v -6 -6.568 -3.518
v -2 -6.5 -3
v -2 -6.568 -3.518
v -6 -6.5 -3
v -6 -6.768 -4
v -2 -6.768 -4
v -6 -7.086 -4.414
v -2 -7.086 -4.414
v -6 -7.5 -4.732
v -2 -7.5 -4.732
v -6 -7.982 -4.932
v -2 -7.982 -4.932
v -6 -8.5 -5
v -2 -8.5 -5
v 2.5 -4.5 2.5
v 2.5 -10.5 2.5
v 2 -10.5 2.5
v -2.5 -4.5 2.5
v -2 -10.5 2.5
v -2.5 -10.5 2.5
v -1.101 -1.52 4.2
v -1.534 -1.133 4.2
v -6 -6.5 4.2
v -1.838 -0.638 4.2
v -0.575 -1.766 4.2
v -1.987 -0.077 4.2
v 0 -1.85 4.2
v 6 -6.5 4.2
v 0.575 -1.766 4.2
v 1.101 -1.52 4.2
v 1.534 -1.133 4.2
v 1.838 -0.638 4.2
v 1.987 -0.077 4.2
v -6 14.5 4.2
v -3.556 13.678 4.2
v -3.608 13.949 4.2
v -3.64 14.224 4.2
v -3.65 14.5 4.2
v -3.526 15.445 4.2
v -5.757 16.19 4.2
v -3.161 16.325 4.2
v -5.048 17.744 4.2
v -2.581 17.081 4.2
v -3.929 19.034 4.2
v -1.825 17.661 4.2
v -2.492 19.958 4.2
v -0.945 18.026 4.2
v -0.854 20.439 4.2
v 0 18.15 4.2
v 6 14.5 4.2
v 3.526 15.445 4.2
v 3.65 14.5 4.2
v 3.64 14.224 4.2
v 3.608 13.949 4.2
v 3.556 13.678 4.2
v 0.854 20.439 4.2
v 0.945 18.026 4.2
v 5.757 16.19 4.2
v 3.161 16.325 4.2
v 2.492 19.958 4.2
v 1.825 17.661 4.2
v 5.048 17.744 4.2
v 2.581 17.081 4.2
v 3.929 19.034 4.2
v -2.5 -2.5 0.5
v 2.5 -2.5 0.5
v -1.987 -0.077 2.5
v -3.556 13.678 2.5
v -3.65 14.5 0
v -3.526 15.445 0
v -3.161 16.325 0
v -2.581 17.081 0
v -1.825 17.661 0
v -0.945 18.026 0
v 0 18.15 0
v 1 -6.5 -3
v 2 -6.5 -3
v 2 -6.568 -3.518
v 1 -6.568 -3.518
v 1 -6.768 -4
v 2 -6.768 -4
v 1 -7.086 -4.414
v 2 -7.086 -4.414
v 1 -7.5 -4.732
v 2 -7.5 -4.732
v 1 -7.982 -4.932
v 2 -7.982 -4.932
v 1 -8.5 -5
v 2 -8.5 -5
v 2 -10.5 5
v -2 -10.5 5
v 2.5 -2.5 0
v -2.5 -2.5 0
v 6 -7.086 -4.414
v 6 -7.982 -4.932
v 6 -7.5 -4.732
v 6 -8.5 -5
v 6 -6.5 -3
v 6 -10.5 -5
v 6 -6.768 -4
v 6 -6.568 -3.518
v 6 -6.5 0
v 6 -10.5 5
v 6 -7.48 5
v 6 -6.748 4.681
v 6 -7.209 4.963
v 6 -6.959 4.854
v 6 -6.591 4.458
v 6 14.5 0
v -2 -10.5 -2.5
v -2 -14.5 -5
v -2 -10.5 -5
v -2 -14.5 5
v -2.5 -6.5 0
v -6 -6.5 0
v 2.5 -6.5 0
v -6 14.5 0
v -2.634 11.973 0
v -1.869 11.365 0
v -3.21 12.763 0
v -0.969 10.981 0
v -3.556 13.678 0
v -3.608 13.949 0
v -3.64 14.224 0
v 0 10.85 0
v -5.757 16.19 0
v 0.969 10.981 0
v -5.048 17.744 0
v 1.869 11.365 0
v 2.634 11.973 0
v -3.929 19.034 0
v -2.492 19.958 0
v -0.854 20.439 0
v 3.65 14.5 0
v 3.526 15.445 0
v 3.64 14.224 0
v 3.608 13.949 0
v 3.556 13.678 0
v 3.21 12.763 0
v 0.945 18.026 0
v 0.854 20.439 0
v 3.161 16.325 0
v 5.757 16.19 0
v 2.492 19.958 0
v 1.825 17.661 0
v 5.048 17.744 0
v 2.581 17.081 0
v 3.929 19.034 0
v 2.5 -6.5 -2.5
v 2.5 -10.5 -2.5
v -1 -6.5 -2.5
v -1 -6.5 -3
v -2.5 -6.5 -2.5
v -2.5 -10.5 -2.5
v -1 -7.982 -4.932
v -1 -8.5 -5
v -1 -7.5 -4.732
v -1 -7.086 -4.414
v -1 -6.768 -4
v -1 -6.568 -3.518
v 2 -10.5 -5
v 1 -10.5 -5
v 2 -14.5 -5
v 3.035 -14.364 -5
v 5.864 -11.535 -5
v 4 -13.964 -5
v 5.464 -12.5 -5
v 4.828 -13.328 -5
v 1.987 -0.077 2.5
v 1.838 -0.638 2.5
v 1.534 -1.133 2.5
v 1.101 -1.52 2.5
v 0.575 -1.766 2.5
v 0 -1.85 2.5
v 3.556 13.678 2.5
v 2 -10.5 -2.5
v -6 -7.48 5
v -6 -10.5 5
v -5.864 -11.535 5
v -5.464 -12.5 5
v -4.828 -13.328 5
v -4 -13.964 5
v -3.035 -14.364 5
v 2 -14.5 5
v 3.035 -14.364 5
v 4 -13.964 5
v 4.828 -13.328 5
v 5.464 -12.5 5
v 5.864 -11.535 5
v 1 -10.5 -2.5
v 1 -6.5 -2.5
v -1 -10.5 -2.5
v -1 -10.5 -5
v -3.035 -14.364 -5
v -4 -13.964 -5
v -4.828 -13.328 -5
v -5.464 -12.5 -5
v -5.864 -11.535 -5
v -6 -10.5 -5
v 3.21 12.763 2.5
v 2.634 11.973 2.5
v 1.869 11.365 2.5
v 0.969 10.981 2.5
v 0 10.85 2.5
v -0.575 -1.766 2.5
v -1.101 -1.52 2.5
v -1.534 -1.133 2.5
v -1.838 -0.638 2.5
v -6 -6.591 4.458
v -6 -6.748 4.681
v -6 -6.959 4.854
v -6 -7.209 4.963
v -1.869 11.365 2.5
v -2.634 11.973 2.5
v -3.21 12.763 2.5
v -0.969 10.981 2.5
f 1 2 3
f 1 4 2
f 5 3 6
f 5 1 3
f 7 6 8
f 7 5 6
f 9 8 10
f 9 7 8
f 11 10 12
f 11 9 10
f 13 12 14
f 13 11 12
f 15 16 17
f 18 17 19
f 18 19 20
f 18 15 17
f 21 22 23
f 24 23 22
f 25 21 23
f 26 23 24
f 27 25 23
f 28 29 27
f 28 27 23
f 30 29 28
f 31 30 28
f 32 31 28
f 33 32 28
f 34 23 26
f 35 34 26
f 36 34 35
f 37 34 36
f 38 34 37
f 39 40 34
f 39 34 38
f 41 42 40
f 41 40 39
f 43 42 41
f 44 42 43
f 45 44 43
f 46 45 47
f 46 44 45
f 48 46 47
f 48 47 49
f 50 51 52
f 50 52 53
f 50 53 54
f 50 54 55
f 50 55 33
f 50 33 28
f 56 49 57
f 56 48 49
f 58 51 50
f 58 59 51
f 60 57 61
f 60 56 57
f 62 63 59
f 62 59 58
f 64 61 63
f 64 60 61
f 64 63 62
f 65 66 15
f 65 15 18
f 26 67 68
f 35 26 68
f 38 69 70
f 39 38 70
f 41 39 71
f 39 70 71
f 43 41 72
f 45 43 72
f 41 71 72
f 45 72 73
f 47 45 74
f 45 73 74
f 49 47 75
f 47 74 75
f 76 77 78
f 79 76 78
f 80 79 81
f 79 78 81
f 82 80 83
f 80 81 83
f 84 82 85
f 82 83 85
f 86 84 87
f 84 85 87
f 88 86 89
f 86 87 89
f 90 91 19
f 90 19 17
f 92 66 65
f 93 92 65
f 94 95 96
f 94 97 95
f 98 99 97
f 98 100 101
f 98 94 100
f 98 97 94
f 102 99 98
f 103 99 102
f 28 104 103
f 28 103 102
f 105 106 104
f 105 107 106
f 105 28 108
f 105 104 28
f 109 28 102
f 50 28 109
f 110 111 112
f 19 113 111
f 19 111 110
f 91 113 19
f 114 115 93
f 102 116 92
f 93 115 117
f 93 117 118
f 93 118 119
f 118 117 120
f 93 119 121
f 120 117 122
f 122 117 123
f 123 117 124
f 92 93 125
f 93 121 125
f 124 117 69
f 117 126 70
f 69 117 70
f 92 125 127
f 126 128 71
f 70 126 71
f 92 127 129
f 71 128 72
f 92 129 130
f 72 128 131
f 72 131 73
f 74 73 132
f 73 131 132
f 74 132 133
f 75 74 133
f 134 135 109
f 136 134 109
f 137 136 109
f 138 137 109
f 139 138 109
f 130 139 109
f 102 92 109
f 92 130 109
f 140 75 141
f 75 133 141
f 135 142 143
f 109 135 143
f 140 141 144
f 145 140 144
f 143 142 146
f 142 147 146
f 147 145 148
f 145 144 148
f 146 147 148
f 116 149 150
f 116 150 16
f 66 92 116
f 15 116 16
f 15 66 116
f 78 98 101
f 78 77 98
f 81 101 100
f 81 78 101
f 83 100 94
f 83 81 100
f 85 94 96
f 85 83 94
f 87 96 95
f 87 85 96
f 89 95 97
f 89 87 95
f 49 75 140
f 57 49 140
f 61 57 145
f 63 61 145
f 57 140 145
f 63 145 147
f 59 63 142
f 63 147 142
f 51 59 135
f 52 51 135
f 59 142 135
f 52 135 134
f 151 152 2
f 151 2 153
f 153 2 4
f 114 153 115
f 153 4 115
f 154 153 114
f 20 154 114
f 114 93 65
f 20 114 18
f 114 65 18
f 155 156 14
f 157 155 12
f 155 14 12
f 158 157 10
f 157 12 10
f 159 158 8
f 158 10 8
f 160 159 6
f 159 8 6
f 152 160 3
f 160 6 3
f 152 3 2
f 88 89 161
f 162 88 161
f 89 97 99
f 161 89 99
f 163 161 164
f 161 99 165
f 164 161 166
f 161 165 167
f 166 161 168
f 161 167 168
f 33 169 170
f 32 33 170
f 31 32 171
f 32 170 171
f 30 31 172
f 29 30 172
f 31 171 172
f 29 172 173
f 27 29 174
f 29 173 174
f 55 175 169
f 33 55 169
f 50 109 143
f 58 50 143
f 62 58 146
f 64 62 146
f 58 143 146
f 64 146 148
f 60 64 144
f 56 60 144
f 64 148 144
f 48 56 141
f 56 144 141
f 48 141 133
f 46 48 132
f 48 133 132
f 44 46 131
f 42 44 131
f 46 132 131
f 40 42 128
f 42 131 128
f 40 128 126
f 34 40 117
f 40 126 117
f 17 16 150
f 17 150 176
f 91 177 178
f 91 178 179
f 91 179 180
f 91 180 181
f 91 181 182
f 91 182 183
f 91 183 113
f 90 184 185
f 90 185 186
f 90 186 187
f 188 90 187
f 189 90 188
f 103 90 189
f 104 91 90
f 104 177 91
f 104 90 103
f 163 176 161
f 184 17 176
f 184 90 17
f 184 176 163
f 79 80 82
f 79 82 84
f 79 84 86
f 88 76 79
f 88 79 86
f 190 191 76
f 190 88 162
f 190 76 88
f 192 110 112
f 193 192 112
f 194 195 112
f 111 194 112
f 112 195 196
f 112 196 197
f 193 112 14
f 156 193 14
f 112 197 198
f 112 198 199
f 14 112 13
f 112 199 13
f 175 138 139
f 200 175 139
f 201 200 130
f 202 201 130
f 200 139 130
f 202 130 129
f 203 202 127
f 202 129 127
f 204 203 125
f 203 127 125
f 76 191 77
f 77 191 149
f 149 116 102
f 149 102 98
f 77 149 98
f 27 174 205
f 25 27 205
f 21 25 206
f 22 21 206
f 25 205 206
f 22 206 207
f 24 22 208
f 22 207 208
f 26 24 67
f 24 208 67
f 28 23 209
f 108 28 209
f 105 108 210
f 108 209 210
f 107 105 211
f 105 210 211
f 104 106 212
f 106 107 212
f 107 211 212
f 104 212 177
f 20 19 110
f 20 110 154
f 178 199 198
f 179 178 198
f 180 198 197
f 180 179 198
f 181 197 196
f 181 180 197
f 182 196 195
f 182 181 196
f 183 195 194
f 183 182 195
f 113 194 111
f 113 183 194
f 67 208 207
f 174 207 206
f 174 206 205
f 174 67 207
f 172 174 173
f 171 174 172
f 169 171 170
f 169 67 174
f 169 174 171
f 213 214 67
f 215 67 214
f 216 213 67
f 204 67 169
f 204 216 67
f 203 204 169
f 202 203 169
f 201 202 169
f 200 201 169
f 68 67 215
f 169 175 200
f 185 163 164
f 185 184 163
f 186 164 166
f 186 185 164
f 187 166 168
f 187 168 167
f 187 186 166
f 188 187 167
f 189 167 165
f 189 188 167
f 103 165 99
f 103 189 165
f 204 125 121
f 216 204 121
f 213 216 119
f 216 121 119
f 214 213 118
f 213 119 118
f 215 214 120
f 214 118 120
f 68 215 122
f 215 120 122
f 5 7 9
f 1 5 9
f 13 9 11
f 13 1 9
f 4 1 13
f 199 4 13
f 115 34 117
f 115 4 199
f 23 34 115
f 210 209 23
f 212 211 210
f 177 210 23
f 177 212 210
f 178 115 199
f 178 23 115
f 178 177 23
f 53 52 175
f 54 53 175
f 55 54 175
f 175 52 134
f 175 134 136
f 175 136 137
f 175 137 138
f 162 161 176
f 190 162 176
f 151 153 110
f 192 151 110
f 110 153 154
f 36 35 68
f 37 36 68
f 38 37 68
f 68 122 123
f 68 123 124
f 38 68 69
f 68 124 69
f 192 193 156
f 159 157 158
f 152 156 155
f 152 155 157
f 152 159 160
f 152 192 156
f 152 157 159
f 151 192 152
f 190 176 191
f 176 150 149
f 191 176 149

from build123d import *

# Parameters (mm, degrees)
F1_DEPTH      = 4.2
F2_DEPTH      = 2.5
F3_DEPTH      = 5
F3_DEPTH_BACK = 5
F4_W          = 5
F4_H          = 5
F5_DEPTH      = 4
F5_DEPTH_BACK = 4
F6_SIZE       = 2
F7_W          = 4
F7_H          = 2.5
F8_DEPTH      = 25
F9_R          = 2
F11_DEPTH     = 1
F13_DEPTH     = 1
F14_T1_DEPTH  = 16.8989794856


# Not quite as in the source:
# - a fillet or chamfer that OpenCascade refuses, or shapes differently, is made with other operations: its cross-section is extruded or revolved along the edge and cut away or added


with BuildPart() as f1:
    # F0 (on Top) → F1 (new body)
    with BuildSketch(Plane.XY):
        with BuildLine():
            ThreePointArc((6, 14.5), (0, 20.5), (-6, 14.5))
            Line((-6, 14.5), (-3.65, 14.5))
            ThreePointArc((-3.65, 14.5), (-2.5809397513, 17.0809397513), (0, 18.15))
            ThreePointArc((0, 18.15), (2.5809397513, 17.0809397513), (3.65, 14.5))
            Line((3.65, 14.5), (6, 14.5))
        make_face()
        with BuildLine():
            Line((6, -6.5), (-6, -6.5))
            Line((-6, -6.5), (-6, -10.5))
            ThreePointArc((-6, -10.5), (-4.8284271247, -13.3284271247), (-2, -14.5))
            Line((-2, -14.5), (-2, -10.5))
            Line((-2, -10.5), (0, -10.5))
            Line((0, -10.5), (2, -10.5))
            Line((2, -10.5), (2, -14.5))
            ThreePointArc((2, -14.5), (4.8284271247, -13.3284271247), (6, -10.5))
            Line((6, -10.5), (6, -6.5))
        make_face()
        with BuildLine():
            Line((-3.65, 14.5), (-6, 14.5))
            Line((-6, 14.5), (-6, -6.5))
            Line((-6, -6.5), (6, -6.5))
            Line((6, -6.5), (6, 14.5))
            Line((6, 14.5), (3.65, 14.5))
            ThreePointArc((3.65, 14.5), (3.6264789057, 14.0862963062), (3.5562187692, 13.6779245377))
            Line((3.5562187692, 13.6779245377), (1.9871117367, -0.0766868897))
            ThreePointArc((1.9871117367, -0.0766868897), (1.3316580306, -1.3422087286), (0, -1.85))
            ThreePointArc((0, -1.85), (-1.3316580225, -1.3422087358), (-1.9871117342, -0.0766869112))
            Line((-1.9871117342, -0.0766869112), (-3.5562187692, 13.6779245377))
            ThreePointArc((-3.5562187692, 13.6779245377), (-3.6264789057, 14.0862963062), (-3.65, 14.5))
        make_face()
    extrude(amount=F1_DEPTH)

    # F0 (on Top) → F2 (join)
    with BuildSketch(Plane.XY):
        with BuildLine():
            ThreePointArc((0, 10.85), (-2.2717751388, 11.6431594866), (-3.5562187692, 13.6779245377))
            Line((-3.5562187692, 13.6779245377), (-1.9871117342, -0.0766869112))
            ThreePointArc((-1.9871117342, -0.0766869112), (-1.4922087358, 1.4816580225), (0, 2.15))
            Line((0, 2.15), (0, 10.85))
        make_face()
        with BuildLine():
            ThreePointArc((3.5562187692, 13.6779245377), (2.2717751388, 11.6431594866), (0, 10.85))
            Line((0, 10.85), (0, 2.15))
            ThreePointArc((0, 2.15), (1.4142135624, 1.5642135624), (2, 0.15))
            ThreePointArc((2, 0.15), (1.9967753346, 0.0364735127), (1.9871117367, -0.0766868897))
            Line((1.9871117367, -0.0766868897), (3.5562187692, 13.6779245377))
        make_face()
        with BuildLine():
            ThreePointArc((0, 2.15), (-1.4922087358, 1.4816580225), (-1.9871117342, -0.0766869112))
            ThreePointArc((-1.9871117342, -0.0766869112), (-1.3316580225, -1.3422087358), (0, -1.85))
            Line((0, -1.85), (0, 2.15))
        make_face()
        with BuildLine():
            ThreePointArc((2, 0.15), (1.4142135624, 1.5642135624), (0, 2.15))
            Line((0, 2.15), (0, -1.85))
            ThreePointArc((0, -1.85), (1.3316580306, -1.3422087286), (1.9871117367, -0.0766868897))
            ThreePointArc((1.9871117367, -0.0766868897), (1.9967753346, 0.0364735127), (2, 0.15))
        make_face()
    extrude(amount=F2_DEPTH)

    # F0 (on Top) → F3 (join, two sides)
    with BuildSketch(Plane.XY) as f3_sk:
        with BuildLine():
            Line((6, -6.5), (-6, -6.5))
            Line((-6, -6.5), (-6, -10.5))
            ThreePointArc((-6, -10.5), (-4.8284271247, -13.3284271247), (-2, -14.5))
            Line((-2, -14.5), (-2, -10.5))
            Line((-2, -10.5), (0, -10.5))
            Line((0, -10.5), (2, -10.5))
            Line((2, -10.5), (2, -14.5))
            ThreePointArc((2, -14.5), (4.8284271247, -13.3284271247), (6, -10.5))
            Line((6, -10.5), (6, -6.5))
        make_face()
    extrude(amount=F3_DEPTH)
    extrude(f3_sk.sketch, amount=-F3_DEPTH_BACK)

    # F4 (on face) → F5 (cut, two sides)
    with BuildSketch(Plane(origin=(0, -6.5, 0), x_dir=(-1, 0, 0), z_dir=(0, 1, 0))) as f5_sk:
        Rectangle(F4_W, F4_H)
    extrude(amount=-F5_DEPTH, mode=Mode.SUBTRACT)
    extrude(f5_sk.sketch, amount=F5_DEPTH_BACK, mode=Mode.SUBTRACT)

    # F6
    f6_edges = [f1.edges().sort_by_distance(p)[0] for p in [
        (0, -2.5, 2.5),
    ]]
    chamfer(f6_edges, length=F6_SIZE)

    # F7 (on face) → F8 (cut)
    with BuildSketch(Plane.XZ.offset(10.5)):
        with Locations((0, -3.75)):
            Rectangle(F7_W, F7_H)
    extrude(amount=-F8_DEPTH, mode=Mode.SUBTRACT)

    # F9
    f9_edges = [f1.edges().sort_by_distance(p)[0] for p in [
        (4, -6.5, -5),
        (-4, -6.5, -5),
    ]]
    fillet(f9_edges, radius=F9_R)

    # F10 (on face) → F11 (join)
    with BuildSketch(Plane.YZ.offset(-2)):
        with BuildLine():
            Line((-6.5, -2.5), (-10.5, -2.5))
            Line((-10.5, -2.5), (-10.5, -5))
            Line((-10.5, -5), (-8.5, -5))
            ThreePointArc((-8.5, -5), (-7.0857864376, -4.4142135624), (-6.5, -3))
            Line((-6.5, -3), (-6.5, -2.5))
        make_face()
    extrude(amount=F11_DEPTH)

    # F12 (on face) → F13 (join)
    with BuildSketch(Plane(origin=(2, 0, 0), x_dir=(0, -1, 0), z_dir=(-1, 0, 0))):
        with BuildLine():
            Line((10.5, -5), (10.5, -2.5))
            Line((10.5, -2.5), (6.5, -2.5))
            Line((6.5, -2.5), (6.5, -3))
            ThreePointArc((6.5, -3), (7.0857864376, -4.4142135624), (8.5, -5))
            Line((8.5, -5), (10.5, -5))
        make_face()
    extrude(amount=F13_DEPTH)

    # F14: fillet of radius 1 on 1 edges, made by hand

    # F14_s2 → F14_t1 (cut)
    with BuildSketch(Plane.YZ.offset(-8.4494897428)):
        with BuildLine():
            ThreePointArc((-6.5, 4.2), (-6.8473403651, 4.7745966692), (-7.4797958971, 5))
            Line((-7.4797958971, 5), (-6.5, 5))
            Line((-6.5, 5), (-6.5, 4.2))
        make_face()
    extrude(amount=F14_T1_DEPTH, mode=Mode.SUBTRACT)


solid = f1.part
